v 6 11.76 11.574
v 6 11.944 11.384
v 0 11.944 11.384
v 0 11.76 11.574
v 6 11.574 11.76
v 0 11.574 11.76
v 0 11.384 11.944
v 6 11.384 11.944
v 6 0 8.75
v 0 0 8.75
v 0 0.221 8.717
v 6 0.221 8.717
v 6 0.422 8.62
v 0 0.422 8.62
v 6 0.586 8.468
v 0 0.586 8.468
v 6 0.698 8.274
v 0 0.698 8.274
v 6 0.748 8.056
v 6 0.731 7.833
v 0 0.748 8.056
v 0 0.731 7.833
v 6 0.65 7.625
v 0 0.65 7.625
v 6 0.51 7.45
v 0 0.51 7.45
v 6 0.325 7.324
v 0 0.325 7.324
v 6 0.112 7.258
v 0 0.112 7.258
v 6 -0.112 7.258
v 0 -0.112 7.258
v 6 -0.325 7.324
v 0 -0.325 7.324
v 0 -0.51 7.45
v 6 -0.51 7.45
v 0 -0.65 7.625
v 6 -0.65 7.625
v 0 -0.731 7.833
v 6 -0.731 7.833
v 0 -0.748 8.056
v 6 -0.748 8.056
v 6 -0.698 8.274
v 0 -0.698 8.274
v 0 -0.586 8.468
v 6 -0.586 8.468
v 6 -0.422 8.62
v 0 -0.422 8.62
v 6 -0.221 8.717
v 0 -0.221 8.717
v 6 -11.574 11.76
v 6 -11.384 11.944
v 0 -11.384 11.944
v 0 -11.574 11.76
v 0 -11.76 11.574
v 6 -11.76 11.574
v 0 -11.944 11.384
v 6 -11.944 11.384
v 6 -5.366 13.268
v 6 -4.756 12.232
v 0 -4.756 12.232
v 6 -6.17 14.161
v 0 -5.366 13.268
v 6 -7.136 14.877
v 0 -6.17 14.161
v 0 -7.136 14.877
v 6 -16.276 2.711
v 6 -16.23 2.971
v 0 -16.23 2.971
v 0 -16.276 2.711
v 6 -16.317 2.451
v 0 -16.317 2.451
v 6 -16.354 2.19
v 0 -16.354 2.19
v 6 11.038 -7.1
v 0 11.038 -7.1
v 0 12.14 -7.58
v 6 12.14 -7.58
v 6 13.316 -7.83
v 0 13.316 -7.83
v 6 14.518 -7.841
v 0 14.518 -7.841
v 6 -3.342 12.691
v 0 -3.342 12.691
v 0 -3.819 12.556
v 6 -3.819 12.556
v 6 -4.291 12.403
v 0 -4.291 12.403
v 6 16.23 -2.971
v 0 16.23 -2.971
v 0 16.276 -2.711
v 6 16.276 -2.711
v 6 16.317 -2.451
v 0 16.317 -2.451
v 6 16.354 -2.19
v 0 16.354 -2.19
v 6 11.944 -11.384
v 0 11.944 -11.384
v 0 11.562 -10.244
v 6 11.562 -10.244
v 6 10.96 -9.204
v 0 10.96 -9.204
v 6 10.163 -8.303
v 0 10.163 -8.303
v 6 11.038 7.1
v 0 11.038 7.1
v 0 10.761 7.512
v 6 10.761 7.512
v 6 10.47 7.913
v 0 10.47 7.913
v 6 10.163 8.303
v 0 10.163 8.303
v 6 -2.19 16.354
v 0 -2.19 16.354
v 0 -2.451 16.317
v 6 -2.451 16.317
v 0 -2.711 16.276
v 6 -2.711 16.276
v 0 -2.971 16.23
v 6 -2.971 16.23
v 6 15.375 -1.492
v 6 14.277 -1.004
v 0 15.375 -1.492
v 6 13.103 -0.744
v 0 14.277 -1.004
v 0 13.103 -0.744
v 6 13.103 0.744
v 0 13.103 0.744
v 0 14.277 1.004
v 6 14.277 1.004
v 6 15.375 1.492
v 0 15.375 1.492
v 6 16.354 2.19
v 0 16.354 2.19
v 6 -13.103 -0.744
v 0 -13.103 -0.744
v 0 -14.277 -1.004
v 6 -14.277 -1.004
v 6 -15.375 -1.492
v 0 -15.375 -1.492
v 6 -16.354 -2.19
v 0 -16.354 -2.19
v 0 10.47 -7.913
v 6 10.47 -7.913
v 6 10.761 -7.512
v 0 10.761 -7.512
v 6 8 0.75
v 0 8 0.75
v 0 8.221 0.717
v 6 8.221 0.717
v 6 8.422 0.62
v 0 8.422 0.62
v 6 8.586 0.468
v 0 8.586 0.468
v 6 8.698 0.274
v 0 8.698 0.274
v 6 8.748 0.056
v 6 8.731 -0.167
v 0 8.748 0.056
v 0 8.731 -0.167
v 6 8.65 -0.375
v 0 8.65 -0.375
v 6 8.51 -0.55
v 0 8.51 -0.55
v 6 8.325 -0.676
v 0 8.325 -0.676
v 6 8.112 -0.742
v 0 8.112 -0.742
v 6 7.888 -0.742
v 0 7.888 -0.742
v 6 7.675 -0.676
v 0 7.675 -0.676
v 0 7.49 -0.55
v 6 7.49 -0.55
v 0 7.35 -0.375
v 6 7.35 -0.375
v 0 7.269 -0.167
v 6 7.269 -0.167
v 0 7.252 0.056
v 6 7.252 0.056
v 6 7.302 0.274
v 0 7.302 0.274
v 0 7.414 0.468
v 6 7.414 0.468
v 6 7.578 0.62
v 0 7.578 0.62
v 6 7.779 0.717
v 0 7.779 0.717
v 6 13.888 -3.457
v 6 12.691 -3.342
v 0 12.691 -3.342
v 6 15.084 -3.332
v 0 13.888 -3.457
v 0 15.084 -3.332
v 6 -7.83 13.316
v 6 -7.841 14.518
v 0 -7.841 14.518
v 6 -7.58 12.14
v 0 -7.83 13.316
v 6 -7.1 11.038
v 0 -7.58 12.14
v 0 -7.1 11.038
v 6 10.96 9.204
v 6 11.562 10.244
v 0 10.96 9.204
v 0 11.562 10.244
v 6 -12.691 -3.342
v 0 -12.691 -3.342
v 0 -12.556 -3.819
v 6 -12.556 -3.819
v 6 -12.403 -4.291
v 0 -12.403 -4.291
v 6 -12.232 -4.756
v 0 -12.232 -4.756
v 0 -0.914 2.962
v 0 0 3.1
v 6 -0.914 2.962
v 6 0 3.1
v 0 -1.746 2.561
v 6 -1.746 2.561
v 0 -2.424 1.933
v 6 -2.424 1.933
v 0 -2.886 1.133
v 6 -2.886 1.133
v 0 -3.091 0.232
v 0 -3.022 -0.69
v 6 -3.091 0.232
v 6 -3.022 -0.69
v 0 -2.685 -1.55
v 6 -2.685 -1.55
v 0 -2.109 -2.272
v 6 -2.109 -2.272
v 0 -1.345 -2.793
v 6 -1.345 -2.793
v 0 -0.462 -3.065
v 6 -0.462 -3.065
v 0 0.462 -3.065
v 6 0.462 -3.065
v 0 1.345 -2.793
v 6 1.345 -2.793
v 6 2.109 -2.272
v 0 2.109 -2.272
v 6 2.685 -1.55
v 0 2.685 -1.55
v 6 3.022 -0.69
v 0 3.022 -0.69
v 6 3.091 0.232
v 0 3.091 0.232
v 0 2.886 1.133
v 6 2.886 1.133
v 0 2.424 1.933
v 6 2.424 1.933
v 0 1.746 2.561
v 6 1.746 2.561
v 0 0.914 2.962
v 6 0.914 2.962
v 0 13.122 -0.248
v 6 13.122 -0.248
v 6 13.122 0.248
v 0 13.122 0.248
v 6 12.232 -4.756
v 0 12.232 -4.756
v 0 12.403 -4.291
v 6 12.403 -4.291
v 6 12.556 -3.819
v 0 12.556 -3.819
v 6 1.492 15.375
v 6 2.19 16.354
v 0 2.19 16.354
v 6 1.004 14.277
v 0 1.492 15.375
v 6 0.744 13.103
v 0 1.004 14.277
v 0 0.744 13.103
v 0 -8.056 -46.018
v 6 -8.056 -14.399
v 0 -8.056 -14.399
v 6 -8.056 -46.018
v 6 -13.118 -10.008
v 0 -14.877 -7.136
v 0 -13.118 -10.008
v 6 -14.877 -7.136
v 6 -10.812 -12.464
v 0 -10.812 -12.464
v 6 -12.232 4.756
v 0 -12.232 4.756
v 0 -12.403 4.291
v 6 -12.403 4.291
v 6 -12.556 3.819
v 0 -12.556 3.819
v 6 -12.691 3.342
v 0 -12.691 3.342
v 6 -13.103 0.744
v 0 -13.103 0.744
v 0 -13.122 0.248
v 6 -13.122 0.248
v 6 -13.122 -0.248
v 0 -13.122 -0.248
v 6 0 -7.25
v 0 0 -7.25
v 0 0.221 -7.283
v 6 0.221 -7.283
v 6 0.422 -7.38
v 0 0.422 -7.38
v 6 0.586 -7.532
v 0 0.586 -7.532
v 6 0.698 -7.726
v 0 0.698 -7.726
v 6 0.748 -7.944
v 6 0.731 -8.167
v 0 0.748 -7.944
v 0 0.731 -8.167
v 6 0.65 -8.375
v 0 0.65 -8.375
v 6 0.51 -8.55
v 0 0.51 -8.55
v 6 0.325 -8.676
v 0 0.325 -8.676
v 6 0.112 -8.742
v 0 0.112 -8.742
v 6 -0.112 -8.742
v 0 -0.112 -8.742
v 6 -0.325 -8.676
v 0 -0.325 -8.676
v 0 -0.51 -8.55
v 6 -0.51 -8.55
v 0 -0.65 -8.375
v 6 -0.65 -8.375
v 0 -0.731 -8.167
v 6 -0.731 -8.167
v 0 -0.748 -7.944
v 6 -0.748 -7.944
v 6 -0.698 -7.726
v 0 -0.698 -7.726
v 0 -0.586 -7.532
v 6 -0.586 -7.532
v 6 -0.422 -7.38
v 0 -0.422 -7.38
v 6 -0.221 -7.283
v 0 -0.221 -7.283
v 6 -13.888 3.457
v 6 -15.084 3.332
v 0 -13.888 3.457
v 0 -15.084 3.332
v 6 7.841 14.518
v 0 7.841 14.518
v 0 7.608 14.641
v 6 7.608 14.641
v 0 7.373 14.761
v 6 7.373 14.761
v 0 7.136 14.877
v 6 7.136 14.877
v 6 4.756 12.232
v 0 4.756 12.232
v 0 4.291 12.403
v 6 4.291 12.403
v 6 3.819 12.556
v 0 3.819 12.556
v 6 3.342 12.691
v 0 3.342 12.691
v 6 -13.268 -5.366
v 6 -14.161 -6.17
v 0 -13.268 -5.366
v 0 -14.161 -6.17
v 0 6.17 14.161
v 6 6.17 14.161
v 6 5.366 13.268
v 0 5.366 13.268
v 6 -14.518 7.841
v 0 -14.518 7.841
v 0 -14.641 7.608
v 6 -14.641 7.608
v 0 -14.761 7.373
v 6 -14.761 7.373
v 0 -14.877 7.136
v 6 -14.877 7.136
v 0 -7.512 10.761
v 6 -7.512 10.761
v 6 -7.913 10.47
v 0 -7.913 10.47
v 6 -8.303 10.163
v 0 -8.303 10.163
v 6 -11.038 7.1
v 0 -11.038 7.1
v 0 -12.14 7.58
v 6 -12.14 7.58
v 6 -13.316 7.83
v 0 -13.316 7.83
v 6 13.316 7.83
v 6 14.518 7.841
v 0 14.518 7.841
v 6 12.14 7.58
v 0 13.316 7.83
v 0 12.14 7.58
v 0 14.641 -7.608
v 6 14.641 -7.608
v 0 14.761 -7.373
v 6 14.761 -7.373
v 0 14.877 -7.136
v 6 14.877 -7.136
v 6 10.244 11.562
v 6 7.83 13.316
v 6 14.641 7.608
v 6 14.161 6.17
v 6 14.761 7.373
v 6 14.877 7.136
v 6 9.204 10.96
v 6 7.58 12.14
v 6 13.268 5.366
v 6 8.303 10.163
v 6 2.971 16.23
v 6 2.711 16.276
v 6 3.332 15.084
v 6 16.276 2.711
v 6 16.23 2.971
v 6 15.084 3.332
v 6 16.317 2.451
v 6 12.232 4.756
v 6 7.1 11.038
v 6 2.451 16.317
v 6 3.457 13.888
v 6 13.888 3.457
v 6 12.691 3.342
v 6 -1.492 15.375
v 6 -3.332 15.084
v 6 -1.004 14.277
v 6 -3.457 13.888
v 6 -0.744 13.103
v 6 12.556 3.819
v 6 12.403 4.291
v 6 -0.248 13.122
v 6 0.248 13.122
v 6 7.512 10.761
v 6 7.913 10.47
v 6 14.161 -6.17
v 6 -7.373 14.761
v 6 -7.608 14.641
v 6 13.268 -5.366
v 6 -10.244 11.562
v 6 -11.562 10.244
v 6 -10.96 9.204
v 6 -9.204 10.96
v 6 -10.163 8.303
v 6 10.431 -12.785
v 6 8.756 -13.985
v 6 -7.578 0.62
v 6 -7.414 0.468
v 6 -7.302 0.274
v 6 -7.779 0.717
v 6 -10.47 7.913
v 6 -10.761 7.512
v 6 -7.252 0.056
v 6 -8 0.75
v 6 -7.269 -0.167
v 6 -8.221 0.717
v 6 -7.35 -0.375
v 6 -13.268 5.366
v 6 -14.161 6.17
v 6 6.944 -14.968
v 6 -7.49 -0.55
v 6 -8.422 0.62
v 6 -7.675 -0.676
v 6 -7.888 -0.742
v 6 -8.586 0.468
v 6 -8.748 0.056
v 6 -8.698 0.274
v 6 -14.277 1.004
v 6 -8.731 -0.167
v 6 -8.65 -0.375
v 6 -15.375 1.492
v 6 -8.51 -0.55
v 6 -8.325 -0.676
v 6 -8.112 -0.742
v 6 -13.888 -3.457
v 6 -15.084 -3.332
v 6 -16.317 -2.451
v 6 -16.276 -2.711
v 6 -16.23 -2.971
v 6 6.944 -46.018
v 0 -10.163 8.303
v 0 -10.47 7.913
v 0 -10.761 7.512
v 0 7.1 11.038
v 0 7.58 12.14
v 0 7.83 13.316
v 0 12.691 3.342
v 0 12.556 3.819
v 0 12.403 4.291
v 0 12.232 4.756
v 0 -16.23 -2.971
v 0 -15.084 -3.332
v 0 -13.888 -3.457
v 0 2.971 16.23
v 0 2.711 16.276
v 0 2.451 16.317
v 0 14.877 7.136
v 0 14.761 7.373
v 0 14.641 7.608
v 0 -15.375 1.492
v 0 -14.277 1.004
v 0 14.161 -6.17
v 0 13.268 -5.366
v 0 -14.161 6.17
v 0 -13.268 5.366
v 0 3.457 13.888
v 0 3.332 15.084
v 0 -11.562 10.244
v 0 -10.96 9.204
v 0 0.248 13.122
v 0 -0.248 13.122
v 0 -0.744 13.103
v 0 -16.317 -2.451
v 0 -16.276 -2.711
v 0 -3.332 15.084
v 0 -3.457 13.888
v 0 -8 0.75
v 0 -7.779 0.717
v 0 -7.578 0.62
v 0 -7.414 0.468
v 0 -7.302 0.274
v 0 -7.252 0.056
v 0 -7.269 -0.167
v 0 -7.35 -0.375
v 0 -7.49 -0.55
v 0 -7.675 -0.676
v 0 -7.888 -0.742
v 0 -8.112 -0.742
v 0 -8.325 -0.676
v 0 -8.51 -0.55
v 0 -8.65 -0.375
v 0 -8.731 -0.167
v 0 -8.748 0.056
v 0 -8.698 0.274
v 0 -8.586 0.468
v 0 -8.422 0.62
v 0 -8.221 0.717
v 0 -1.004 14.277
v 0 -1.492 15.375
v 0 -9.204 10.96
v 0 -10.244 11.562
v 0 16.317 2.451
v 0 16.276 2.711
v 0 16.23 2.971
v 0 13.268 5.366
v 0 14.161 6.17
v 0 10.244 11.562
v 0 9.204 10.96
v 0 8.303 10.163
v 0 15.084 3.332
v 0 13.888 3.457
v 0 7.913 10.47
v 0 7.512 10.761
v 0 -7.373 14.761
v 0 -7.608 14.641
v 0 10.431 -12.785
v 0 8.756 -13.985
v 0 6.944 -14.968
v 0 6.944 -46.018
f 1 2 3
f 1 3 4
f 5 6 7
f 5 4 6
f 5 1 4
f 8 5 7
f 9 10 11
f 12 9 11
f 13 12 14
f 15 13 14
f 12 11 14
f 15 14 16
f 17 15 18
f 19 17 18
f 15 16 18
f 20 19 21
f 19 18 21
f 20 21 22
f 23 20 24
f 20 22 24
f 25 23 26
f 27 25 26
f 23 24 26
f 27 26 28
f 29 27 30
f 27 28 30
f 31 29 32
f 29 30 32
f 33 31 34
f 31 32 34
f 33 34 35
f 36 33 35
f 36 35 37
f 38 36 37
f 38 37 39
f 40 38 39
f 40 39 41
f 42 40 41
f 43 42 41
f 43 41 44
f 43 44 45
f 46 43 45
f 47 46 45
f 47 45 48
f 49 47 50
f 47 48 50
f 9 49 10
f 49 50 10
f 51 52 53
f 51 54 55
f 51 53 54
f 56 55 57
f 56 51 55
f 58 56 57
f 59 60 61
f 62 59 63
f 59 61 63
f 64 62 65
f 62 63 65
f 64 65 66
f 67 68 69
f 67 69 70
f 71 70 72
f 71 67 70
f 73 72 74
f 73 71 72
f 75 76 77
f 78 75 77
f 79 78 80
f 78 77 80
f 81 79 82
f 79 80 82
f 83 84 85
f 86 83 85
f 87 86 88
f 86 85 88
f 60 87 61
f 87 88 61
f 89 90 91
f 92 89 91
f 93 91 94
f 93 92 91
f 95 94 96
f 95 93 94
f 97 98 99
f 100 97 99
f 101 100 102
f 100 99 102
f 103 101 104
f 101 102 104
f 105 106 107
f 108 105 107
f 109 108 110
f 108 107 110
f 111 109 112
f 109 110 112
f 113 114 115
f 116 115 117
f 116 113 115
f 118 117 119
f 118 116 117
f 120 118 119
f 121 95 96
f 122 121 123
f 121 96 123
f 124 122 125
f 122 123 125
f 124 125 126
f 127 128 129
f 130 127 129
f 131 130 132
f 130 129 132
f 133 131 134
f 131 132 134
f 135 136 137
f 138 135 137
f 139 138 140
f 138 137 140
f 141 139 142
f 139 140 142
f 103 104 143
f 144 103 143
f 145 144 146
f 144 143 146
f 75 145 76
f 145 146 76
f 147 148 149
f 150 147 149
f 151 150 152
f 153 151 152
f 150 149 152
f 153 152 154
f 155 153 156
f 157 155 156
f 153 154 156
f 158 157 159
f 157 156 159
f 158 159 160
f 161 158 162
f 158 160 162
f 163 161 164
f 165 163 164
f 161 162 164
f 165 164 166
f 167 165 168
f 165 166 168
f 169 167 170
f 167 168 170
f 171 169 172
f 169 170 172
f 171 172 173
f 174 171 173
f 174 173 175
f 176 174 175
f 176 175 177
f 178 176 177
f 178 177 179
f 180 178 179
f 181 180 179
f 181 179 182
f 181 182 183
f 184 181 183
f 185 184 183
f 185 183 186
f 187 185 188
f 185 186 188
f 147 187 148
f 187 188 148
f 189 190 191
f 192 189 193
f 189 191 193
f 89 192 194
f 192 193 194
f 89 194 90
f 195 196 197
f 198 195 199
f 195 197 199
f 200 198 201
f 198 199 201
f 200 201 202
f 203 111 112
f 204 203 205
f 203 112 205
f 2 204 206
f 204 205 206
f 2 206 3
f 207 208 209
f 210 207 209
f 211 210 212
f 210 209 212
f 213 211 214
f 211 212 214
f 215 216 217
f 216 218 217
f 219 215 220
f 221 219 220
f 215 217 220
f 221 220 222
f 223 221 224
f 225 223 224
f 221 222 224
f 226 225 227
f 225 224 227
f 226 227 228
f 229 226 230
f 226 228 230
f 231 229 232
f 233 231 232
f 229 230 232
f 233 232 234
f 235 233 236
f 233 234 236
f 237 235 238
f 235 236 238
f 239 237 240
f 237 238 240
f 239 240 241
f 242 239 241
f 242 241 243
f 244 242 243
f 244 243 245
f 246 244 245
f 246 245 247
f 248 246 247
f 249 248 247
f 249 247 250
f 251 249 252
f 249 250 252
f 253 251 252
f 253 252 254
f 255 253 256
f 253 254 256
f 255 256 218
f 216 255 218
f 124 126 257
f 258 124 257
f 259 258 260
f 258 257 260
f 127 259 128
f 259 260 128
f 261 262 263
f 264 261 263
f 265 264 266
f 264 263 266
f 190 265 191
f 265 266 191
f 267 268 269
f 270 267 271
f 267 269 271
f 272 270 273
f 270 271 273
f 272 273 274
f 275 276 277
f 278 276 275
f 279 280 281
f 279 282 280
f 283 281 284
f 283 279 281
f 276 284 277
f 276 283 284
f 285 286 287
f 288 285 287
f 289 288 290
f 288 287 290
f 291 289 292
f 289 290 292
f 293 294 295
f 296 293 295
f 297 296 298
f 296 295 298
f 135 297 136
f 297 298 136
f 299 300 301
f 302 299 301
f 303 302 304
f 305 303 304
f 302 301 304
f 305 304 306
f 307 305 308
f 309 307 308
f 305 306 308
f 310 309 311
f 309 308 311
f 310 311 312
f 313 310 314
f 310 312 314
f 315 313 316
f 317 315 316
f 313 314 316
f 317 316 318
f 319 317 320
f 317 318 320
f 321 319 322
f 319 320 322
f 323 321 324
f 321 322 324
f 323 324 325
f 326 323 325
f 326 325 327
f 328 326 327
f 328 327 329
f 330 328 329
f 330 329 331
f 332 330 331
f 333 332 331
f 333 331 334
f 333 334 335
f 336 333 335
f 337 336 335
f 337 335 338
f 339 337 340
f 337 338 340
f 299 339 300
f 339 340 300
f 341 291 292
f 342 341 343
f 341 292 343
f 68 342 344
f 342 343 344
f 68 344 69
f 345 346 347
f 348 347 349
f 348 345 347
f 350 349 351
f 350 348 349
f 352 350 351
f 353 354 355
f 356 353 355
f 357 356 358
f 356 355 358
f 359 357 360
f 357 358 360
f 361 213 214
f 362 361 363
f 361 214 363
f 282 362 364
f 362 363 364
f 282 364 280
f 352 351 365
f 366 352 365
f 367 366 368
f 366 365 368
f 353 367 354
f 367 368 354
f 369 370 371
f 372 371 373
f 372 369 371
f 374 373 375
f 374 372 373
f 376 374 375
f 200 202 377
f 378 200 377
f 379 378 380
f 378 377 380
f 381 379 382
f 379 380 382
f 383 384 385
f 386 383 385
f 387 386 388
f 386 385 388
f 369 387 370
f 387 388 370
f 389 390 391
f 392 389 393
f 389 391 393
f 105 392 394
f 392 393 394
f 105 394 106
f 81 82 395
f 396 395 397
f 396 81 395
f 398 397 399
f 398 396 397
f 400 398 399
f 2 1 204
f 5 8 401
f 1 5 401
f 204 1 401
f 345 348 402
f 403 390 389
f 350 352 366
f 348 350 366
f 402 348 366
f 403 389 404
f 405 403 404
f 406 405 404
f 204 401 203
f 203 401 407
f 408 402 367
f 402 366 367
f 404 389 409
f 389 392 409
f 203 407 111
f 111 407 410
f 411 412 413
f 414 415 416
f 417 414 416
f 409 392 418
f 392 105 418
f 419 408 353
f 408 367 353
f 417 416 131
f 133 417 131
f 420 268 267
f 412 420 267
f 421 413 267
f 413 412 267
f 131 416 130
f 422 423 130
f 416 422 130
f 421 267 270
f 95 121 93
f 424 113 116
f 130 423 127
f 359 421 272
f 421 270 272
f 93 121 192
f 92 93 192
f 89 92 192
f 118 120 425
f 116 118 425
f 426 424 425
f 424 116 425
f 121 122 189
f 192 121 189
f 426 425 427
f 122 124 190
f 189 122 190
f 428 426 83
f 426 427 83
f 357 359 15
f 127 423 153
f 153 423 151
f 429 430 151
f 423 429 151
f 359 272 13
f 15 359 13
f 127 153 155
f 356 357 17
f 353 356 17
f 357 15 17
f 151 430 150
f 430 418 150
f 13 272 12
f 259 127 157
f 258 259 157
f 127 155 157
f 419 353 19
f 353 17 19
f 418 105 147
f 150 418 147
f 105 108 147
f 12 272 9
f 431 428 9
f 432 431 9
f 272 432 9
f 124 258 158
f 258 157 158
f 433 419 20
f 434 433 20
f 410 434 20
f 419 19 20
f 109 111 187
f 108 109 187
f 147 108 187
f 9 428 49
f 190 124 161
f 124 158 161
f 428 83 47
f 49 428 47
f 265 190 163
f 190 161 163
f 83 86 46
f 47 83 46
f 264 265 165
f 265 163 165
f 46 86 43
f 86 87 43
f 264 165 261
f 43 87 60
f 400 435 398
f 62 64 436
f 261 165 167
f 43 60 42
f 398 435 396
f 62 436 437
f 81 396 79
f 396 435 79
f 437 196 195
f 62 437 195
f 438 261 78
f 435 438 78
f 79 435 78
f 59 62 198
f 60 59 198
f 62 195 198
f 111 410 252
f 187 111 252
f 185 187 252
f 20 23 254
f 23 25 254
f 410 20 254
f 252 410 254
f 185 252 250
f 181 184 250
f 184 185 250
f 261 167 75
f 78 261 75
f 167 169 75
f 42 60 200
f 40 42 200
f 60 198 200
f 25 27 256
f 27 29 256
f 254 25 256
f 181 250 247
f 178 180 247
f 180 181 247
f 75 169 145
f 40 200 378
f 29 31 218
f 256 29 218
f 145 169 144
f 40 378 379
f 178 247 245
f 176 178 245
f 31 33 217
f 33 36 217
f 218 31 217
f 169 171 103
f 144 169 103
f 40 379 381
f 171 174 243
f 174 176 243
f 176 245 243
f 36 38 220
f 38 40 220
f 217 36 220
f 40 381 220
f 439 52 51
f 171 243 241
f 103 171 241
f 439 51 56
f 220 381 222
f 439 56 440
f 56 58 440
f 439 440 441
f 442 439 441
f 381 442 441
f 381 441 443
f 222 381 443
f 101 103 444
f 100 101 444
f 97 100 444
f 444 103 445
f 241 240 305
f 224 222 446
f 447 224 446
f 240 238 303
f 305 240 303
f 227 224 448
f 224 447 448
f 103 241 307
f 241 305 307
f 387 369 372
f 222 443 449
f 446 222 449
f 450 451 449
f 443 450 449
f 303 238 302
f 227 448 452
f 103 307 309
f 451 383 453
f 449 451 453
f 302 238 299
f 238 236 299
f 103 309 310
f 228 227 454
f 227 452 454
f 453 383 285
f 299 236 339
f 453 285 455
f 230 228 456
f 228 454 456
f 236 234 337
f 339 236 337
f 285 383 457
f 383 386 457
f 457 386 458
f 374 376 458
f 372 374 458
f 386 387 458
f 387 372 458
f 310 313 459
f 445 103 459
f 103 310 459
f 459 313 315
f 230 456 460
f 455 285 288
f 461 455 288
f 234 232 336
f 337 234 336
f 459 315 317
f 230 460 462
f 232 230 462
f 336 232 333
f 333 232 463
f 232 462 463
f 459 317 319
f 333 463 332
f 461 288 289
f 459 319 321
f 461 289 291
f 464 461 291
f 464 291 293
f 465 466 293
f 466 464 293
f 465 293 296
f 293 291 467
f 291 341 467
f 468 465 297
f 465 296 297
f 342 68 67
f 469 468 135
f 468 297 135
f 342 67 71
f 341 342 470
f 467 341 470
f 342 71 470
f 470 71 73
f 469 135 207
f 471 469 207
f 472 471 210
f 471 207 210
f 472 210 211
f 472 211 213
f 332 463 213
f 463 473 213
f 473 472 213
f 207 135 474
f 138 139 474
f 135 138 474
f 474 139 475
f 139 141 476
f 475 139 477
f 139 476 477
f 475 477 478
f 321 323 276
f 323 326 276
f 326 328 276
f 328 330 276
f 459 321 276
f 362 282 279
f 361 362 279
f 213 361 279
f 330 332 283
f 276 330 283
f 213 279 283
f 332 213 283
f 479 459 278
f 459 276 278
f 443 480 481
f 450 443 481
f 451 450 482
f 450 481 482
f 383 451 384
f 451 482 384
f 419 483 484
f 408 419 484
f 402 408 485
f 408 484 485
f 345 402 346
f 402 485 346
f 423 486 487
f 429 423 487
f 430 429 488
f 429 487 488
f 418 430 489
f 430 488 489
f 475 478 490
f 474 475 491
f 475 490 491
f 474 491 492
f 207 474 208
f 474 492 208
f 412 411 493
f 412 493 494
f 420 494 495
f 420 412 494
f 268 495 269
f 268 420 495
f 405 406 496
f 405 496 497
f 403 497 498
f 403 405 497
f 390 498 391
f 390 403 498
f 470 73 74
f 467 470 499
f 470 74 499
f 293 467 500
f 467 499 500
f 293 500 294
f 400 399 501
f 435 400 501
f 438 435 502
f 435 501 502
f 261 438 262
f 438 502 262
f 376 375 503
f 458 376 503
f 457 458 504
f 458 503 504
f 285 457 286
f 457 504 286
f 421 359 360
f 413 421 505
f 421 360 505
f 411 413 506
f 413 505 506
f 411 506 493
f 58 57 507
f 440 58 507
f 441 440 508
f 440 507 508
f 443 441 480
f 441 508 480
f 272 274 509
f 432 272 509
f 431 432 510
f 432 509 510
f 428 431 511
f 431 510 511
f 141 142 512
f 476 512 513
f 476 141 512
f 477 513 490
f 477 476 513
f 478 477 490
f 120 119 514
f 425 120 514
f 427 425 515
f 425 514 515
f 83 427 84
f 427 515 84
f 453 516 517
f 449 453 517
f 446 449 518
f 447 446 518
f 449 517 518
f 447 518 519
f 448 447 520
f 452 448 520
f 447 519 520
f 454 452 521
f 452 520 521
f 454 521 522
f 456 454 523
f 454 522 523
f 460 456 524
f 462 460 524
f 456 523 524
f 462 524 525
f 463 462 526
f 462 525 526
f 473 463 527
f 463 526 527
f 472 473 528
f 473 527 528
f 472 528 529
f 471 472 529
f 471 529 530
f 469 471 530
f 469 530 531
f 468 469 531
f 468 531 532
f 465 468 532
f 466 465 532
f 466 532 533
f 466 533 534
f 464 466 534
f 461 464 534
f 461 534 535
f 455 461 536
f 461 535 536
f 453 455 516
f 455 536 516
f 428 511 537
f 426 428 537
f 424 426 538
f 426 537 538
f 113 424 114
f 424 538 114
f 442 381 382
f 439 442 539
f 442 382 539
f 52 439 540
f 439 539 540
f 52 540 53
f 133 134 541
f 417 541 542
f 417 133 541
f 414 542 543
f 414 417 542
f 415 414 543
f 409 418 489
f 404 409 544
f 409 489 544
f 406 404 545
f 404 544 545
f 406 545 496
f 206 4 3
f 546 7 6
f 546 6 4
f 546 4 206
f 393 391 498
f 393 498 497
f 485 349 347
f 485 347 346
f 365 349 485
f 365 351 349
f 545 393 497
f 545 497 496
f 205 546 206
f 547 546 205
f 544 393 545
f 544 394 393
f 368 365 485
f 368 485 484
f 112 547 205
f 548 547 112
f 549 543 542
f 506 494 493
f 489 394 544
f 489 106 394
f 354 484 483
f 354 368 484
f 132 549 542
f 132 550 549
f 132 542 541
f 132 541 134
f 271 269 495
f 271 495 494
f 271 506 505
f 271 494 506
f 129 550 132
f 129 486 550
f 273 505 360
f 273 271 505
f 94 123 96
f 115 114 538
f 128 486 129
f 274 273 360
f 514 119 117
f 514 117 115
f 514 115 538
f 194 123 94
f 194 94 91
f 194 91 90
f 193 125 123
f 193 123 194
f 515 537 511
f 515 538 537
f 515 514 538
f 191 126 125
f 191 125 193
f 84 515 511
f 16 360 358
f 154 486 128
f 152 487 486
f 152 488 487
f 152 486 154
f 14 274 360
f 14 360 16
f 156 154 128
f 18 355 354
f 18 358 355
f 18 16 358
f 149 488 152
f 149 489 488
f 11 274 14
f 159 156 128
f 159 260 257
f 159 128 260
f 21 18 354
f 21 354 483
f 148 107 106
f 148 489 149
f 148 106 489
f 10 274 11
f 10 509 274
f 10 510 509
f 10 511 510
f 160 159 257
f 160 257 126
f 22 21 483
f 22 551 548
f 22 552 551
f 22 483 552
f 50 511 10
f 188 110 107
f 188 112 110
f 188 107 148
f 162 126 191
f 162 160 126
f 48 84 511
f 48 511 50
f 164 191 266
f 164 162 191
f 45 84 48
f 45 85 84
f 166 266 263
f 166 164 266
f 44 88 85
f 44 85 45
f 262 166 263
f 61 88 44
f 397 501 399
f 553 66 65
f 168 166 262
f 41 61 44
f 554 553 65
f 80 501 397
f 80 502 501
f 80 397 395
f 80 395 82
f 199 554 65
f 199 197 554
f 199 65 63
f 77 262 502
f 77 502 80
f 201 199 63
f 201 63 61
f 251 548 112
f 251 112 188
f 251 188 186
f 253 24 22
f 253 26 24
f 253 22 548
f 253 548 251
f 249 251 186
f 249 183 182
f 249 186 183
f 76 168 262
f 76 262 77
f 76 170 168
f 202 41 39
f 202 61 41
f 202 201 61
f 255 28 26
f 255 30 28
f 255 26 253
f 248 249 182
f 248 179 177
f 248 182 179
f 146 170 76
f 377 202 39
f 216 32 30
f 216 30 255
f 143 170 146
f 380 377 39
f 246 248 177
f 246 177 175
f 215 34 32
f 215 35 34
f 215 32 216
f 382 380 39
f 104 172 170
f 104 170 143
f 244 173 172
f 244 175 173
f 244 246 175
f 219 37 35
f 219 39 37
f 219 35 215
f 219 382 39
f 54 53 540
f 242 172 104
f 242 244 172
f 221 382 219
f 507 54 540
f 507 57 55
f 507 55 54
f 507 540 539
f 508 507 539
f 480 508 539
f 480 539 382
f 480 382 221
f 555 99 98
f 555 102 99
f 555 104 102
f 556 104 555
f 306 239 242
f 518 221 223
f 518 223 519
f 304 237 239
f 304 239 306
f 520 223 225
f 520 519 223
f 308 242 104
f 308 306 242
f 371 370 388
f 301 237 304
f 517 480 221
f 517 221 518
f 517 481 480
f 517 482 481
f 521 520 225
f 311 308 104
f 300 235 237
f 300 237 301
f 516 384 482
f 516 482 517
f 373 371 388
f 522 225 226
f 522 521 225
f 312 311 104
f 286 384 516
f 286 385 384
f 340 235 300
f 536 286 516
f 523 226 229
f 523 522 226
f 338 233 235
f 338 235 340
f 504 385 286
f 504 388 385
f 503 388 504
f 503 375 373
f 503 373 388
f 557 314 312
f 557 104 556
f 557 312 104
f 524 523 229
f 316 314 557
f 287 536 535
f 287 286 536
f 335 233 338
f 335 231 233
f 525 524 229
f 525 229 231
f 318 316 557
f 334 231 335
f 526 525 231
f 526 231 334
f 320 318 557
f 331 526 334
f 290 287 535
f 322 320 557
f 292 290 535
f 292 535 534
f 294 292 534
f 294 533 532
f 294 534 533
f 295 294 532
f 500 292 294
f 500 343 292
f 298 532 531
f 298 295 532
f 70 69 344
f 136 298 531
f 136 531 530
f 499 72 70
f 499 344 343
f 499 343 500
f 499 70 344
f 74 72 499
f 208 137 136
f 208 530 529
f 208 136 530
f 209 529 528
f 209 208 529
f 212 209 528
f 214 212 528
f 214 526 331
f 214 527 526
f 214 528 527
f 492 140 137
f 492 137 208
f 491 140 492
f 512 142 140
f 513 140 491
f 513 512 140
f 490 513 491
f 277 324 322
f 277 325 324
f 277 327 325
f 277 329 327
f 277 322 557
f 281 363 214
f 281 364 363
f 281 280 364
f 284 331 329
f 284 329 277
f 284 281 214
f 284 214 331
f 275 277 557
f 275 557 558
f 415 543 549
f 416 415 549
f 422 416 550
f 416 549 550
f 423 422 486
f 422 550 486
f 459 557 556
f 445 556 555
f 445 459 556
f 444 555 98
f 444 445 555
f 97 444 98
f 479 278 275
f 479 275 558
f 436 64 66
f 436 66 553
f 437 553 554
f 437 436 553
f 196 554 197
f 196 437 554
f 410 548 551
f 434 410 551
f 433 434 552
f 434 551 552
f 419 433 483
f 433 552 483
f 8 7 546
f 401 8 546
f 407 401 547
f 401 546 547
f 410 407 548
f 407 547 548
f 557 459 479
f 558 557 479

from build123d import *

# Parameters (mm, degrees)
BASPROSKE_W             = 6
BASPROSKE_H             = 16.5
TOOTHCUT_DEPTH          = 25.093567606
TEETHCUTS_COUNT         = 20
TEETHCUTS_ANGLE         = 342
BORSKE_R                = 3.1
BORE_DEPTH              = 50.0000508
ESQUISSE2_W             = 34.6
ESQUISSE2_H             = 15
BOSS_EXTRU_1_DEPTH      = 6
ESQUISSE3_R             = 0.75
ENL_V_MAT_EXTRU_1_DEPTH = 6


with BuildPart() as part:
    # BasProSke → Base-Revolve (revolve)
    with BuildSketch(Plane(origin=(0, 0, 0), x_dir=(1, 0, 0), z_dir=(0, 1, 0)), mode=Mode.PRIVATE) as base_revolve_sk:
        with Locations((3, 8.25)):
            Rectangle(BASPROSKE_W, BASPROSKE_H)
    revolve(base_revolve_sk.sketch.rotate(Axis((-10, 0, 0), (1, 0, 0)), 180), axis=Axis((-10, 0, 0), (1, 0, 0)))

    # TooCutSke → ToothCut (cut, through all)
    with BuildSketch(Plane(origin=(0, 0, 0), x_dir=(0, 0, -1), z_dir=(1, 0, 0))):
        with BuildLine():
            ThreePointArc((0.74381438, 13.102904875), (0, 13.124), (-0.74381438, 13.102904875))
            ThreePointArc((-0.74381438, 13.102904875), (-1.226473103, 14.852072512), (-2.209965745, 16.376962373))
            ThreePointArc((-2.209965745, 16.376962373), (0, 16.5254), (2.209965745, 16.376962373))
            ThreePointArc((2.209965745, 16.376962373), (1.226473103, 14.852072512), (0.74381438, 13.102904875))
        make_face()
    toothcut = extrude(amount=TOOTHCUT_DEPTH, mode=Mode.SUBTRACT)

    # TeethCuts: ToothCut ×20 about axis, 6 skipped
    teethcuts_axis = Axis((-10, 0, 0), (1, 0, 0))
    add([toothcut.rotate(teethcuts_axis, i * TEETHCUTS_ANGLE / (TEETHCUTS_COUNT - 1)) for i in range(1, TEETHCUTS_COUNT) if i not in (12, 13, 14, 15, 16, 17)], mode=Mode.SUBTRACT)

    # BorSke → Bore (cut, symmetric)
    with BuildSketch(Plane(origin=(0, 0, 0), x_dir=(0, 0, -1), z_dir=(1, 0, 0))):
        with Locations(Location((0, 0, 0), (0, 0, 180))):
            Circle(BORSKE_R)
    extrude(amount=BORE_DEPTH, both=True, mode=Mode.SUBTRACT)

    # Esquisse2 → Boss.-Extru.1 (add)
    with BuildSketch(Plane(origin=(6, 0, 0), x_dir=(0, 0, -1), z_dir=(1, 0, 0))):
        with Locations((28.717803782, -0.556420359)):
            Rectangle(ESQUISSE2_W, ESQUISSE2_H)
    extrude(amount=-BOSS_EXTRU_1_DEPTH)

    # Esquisse3 → Enlèv. mat.-Extru.1 (cut)
    with BuildSketch(Plane.ZY):
        with Locations((8, 0)):
            Circle(ESQUISSE3_R)
        with Locations((0, 8)):
            Circle(ESQUISSE3_R)
        with Locations((0, -8)):
            Circle(ESQUISSE3_R)
        with Locations((-8, 0)):
            Circle(ESQUISSE3_R)
    extrude(amount=-ENL_V_MAT_EXTRU_1_DEPTH, mode=Mode.SUBTRACT)


solid = part.part
